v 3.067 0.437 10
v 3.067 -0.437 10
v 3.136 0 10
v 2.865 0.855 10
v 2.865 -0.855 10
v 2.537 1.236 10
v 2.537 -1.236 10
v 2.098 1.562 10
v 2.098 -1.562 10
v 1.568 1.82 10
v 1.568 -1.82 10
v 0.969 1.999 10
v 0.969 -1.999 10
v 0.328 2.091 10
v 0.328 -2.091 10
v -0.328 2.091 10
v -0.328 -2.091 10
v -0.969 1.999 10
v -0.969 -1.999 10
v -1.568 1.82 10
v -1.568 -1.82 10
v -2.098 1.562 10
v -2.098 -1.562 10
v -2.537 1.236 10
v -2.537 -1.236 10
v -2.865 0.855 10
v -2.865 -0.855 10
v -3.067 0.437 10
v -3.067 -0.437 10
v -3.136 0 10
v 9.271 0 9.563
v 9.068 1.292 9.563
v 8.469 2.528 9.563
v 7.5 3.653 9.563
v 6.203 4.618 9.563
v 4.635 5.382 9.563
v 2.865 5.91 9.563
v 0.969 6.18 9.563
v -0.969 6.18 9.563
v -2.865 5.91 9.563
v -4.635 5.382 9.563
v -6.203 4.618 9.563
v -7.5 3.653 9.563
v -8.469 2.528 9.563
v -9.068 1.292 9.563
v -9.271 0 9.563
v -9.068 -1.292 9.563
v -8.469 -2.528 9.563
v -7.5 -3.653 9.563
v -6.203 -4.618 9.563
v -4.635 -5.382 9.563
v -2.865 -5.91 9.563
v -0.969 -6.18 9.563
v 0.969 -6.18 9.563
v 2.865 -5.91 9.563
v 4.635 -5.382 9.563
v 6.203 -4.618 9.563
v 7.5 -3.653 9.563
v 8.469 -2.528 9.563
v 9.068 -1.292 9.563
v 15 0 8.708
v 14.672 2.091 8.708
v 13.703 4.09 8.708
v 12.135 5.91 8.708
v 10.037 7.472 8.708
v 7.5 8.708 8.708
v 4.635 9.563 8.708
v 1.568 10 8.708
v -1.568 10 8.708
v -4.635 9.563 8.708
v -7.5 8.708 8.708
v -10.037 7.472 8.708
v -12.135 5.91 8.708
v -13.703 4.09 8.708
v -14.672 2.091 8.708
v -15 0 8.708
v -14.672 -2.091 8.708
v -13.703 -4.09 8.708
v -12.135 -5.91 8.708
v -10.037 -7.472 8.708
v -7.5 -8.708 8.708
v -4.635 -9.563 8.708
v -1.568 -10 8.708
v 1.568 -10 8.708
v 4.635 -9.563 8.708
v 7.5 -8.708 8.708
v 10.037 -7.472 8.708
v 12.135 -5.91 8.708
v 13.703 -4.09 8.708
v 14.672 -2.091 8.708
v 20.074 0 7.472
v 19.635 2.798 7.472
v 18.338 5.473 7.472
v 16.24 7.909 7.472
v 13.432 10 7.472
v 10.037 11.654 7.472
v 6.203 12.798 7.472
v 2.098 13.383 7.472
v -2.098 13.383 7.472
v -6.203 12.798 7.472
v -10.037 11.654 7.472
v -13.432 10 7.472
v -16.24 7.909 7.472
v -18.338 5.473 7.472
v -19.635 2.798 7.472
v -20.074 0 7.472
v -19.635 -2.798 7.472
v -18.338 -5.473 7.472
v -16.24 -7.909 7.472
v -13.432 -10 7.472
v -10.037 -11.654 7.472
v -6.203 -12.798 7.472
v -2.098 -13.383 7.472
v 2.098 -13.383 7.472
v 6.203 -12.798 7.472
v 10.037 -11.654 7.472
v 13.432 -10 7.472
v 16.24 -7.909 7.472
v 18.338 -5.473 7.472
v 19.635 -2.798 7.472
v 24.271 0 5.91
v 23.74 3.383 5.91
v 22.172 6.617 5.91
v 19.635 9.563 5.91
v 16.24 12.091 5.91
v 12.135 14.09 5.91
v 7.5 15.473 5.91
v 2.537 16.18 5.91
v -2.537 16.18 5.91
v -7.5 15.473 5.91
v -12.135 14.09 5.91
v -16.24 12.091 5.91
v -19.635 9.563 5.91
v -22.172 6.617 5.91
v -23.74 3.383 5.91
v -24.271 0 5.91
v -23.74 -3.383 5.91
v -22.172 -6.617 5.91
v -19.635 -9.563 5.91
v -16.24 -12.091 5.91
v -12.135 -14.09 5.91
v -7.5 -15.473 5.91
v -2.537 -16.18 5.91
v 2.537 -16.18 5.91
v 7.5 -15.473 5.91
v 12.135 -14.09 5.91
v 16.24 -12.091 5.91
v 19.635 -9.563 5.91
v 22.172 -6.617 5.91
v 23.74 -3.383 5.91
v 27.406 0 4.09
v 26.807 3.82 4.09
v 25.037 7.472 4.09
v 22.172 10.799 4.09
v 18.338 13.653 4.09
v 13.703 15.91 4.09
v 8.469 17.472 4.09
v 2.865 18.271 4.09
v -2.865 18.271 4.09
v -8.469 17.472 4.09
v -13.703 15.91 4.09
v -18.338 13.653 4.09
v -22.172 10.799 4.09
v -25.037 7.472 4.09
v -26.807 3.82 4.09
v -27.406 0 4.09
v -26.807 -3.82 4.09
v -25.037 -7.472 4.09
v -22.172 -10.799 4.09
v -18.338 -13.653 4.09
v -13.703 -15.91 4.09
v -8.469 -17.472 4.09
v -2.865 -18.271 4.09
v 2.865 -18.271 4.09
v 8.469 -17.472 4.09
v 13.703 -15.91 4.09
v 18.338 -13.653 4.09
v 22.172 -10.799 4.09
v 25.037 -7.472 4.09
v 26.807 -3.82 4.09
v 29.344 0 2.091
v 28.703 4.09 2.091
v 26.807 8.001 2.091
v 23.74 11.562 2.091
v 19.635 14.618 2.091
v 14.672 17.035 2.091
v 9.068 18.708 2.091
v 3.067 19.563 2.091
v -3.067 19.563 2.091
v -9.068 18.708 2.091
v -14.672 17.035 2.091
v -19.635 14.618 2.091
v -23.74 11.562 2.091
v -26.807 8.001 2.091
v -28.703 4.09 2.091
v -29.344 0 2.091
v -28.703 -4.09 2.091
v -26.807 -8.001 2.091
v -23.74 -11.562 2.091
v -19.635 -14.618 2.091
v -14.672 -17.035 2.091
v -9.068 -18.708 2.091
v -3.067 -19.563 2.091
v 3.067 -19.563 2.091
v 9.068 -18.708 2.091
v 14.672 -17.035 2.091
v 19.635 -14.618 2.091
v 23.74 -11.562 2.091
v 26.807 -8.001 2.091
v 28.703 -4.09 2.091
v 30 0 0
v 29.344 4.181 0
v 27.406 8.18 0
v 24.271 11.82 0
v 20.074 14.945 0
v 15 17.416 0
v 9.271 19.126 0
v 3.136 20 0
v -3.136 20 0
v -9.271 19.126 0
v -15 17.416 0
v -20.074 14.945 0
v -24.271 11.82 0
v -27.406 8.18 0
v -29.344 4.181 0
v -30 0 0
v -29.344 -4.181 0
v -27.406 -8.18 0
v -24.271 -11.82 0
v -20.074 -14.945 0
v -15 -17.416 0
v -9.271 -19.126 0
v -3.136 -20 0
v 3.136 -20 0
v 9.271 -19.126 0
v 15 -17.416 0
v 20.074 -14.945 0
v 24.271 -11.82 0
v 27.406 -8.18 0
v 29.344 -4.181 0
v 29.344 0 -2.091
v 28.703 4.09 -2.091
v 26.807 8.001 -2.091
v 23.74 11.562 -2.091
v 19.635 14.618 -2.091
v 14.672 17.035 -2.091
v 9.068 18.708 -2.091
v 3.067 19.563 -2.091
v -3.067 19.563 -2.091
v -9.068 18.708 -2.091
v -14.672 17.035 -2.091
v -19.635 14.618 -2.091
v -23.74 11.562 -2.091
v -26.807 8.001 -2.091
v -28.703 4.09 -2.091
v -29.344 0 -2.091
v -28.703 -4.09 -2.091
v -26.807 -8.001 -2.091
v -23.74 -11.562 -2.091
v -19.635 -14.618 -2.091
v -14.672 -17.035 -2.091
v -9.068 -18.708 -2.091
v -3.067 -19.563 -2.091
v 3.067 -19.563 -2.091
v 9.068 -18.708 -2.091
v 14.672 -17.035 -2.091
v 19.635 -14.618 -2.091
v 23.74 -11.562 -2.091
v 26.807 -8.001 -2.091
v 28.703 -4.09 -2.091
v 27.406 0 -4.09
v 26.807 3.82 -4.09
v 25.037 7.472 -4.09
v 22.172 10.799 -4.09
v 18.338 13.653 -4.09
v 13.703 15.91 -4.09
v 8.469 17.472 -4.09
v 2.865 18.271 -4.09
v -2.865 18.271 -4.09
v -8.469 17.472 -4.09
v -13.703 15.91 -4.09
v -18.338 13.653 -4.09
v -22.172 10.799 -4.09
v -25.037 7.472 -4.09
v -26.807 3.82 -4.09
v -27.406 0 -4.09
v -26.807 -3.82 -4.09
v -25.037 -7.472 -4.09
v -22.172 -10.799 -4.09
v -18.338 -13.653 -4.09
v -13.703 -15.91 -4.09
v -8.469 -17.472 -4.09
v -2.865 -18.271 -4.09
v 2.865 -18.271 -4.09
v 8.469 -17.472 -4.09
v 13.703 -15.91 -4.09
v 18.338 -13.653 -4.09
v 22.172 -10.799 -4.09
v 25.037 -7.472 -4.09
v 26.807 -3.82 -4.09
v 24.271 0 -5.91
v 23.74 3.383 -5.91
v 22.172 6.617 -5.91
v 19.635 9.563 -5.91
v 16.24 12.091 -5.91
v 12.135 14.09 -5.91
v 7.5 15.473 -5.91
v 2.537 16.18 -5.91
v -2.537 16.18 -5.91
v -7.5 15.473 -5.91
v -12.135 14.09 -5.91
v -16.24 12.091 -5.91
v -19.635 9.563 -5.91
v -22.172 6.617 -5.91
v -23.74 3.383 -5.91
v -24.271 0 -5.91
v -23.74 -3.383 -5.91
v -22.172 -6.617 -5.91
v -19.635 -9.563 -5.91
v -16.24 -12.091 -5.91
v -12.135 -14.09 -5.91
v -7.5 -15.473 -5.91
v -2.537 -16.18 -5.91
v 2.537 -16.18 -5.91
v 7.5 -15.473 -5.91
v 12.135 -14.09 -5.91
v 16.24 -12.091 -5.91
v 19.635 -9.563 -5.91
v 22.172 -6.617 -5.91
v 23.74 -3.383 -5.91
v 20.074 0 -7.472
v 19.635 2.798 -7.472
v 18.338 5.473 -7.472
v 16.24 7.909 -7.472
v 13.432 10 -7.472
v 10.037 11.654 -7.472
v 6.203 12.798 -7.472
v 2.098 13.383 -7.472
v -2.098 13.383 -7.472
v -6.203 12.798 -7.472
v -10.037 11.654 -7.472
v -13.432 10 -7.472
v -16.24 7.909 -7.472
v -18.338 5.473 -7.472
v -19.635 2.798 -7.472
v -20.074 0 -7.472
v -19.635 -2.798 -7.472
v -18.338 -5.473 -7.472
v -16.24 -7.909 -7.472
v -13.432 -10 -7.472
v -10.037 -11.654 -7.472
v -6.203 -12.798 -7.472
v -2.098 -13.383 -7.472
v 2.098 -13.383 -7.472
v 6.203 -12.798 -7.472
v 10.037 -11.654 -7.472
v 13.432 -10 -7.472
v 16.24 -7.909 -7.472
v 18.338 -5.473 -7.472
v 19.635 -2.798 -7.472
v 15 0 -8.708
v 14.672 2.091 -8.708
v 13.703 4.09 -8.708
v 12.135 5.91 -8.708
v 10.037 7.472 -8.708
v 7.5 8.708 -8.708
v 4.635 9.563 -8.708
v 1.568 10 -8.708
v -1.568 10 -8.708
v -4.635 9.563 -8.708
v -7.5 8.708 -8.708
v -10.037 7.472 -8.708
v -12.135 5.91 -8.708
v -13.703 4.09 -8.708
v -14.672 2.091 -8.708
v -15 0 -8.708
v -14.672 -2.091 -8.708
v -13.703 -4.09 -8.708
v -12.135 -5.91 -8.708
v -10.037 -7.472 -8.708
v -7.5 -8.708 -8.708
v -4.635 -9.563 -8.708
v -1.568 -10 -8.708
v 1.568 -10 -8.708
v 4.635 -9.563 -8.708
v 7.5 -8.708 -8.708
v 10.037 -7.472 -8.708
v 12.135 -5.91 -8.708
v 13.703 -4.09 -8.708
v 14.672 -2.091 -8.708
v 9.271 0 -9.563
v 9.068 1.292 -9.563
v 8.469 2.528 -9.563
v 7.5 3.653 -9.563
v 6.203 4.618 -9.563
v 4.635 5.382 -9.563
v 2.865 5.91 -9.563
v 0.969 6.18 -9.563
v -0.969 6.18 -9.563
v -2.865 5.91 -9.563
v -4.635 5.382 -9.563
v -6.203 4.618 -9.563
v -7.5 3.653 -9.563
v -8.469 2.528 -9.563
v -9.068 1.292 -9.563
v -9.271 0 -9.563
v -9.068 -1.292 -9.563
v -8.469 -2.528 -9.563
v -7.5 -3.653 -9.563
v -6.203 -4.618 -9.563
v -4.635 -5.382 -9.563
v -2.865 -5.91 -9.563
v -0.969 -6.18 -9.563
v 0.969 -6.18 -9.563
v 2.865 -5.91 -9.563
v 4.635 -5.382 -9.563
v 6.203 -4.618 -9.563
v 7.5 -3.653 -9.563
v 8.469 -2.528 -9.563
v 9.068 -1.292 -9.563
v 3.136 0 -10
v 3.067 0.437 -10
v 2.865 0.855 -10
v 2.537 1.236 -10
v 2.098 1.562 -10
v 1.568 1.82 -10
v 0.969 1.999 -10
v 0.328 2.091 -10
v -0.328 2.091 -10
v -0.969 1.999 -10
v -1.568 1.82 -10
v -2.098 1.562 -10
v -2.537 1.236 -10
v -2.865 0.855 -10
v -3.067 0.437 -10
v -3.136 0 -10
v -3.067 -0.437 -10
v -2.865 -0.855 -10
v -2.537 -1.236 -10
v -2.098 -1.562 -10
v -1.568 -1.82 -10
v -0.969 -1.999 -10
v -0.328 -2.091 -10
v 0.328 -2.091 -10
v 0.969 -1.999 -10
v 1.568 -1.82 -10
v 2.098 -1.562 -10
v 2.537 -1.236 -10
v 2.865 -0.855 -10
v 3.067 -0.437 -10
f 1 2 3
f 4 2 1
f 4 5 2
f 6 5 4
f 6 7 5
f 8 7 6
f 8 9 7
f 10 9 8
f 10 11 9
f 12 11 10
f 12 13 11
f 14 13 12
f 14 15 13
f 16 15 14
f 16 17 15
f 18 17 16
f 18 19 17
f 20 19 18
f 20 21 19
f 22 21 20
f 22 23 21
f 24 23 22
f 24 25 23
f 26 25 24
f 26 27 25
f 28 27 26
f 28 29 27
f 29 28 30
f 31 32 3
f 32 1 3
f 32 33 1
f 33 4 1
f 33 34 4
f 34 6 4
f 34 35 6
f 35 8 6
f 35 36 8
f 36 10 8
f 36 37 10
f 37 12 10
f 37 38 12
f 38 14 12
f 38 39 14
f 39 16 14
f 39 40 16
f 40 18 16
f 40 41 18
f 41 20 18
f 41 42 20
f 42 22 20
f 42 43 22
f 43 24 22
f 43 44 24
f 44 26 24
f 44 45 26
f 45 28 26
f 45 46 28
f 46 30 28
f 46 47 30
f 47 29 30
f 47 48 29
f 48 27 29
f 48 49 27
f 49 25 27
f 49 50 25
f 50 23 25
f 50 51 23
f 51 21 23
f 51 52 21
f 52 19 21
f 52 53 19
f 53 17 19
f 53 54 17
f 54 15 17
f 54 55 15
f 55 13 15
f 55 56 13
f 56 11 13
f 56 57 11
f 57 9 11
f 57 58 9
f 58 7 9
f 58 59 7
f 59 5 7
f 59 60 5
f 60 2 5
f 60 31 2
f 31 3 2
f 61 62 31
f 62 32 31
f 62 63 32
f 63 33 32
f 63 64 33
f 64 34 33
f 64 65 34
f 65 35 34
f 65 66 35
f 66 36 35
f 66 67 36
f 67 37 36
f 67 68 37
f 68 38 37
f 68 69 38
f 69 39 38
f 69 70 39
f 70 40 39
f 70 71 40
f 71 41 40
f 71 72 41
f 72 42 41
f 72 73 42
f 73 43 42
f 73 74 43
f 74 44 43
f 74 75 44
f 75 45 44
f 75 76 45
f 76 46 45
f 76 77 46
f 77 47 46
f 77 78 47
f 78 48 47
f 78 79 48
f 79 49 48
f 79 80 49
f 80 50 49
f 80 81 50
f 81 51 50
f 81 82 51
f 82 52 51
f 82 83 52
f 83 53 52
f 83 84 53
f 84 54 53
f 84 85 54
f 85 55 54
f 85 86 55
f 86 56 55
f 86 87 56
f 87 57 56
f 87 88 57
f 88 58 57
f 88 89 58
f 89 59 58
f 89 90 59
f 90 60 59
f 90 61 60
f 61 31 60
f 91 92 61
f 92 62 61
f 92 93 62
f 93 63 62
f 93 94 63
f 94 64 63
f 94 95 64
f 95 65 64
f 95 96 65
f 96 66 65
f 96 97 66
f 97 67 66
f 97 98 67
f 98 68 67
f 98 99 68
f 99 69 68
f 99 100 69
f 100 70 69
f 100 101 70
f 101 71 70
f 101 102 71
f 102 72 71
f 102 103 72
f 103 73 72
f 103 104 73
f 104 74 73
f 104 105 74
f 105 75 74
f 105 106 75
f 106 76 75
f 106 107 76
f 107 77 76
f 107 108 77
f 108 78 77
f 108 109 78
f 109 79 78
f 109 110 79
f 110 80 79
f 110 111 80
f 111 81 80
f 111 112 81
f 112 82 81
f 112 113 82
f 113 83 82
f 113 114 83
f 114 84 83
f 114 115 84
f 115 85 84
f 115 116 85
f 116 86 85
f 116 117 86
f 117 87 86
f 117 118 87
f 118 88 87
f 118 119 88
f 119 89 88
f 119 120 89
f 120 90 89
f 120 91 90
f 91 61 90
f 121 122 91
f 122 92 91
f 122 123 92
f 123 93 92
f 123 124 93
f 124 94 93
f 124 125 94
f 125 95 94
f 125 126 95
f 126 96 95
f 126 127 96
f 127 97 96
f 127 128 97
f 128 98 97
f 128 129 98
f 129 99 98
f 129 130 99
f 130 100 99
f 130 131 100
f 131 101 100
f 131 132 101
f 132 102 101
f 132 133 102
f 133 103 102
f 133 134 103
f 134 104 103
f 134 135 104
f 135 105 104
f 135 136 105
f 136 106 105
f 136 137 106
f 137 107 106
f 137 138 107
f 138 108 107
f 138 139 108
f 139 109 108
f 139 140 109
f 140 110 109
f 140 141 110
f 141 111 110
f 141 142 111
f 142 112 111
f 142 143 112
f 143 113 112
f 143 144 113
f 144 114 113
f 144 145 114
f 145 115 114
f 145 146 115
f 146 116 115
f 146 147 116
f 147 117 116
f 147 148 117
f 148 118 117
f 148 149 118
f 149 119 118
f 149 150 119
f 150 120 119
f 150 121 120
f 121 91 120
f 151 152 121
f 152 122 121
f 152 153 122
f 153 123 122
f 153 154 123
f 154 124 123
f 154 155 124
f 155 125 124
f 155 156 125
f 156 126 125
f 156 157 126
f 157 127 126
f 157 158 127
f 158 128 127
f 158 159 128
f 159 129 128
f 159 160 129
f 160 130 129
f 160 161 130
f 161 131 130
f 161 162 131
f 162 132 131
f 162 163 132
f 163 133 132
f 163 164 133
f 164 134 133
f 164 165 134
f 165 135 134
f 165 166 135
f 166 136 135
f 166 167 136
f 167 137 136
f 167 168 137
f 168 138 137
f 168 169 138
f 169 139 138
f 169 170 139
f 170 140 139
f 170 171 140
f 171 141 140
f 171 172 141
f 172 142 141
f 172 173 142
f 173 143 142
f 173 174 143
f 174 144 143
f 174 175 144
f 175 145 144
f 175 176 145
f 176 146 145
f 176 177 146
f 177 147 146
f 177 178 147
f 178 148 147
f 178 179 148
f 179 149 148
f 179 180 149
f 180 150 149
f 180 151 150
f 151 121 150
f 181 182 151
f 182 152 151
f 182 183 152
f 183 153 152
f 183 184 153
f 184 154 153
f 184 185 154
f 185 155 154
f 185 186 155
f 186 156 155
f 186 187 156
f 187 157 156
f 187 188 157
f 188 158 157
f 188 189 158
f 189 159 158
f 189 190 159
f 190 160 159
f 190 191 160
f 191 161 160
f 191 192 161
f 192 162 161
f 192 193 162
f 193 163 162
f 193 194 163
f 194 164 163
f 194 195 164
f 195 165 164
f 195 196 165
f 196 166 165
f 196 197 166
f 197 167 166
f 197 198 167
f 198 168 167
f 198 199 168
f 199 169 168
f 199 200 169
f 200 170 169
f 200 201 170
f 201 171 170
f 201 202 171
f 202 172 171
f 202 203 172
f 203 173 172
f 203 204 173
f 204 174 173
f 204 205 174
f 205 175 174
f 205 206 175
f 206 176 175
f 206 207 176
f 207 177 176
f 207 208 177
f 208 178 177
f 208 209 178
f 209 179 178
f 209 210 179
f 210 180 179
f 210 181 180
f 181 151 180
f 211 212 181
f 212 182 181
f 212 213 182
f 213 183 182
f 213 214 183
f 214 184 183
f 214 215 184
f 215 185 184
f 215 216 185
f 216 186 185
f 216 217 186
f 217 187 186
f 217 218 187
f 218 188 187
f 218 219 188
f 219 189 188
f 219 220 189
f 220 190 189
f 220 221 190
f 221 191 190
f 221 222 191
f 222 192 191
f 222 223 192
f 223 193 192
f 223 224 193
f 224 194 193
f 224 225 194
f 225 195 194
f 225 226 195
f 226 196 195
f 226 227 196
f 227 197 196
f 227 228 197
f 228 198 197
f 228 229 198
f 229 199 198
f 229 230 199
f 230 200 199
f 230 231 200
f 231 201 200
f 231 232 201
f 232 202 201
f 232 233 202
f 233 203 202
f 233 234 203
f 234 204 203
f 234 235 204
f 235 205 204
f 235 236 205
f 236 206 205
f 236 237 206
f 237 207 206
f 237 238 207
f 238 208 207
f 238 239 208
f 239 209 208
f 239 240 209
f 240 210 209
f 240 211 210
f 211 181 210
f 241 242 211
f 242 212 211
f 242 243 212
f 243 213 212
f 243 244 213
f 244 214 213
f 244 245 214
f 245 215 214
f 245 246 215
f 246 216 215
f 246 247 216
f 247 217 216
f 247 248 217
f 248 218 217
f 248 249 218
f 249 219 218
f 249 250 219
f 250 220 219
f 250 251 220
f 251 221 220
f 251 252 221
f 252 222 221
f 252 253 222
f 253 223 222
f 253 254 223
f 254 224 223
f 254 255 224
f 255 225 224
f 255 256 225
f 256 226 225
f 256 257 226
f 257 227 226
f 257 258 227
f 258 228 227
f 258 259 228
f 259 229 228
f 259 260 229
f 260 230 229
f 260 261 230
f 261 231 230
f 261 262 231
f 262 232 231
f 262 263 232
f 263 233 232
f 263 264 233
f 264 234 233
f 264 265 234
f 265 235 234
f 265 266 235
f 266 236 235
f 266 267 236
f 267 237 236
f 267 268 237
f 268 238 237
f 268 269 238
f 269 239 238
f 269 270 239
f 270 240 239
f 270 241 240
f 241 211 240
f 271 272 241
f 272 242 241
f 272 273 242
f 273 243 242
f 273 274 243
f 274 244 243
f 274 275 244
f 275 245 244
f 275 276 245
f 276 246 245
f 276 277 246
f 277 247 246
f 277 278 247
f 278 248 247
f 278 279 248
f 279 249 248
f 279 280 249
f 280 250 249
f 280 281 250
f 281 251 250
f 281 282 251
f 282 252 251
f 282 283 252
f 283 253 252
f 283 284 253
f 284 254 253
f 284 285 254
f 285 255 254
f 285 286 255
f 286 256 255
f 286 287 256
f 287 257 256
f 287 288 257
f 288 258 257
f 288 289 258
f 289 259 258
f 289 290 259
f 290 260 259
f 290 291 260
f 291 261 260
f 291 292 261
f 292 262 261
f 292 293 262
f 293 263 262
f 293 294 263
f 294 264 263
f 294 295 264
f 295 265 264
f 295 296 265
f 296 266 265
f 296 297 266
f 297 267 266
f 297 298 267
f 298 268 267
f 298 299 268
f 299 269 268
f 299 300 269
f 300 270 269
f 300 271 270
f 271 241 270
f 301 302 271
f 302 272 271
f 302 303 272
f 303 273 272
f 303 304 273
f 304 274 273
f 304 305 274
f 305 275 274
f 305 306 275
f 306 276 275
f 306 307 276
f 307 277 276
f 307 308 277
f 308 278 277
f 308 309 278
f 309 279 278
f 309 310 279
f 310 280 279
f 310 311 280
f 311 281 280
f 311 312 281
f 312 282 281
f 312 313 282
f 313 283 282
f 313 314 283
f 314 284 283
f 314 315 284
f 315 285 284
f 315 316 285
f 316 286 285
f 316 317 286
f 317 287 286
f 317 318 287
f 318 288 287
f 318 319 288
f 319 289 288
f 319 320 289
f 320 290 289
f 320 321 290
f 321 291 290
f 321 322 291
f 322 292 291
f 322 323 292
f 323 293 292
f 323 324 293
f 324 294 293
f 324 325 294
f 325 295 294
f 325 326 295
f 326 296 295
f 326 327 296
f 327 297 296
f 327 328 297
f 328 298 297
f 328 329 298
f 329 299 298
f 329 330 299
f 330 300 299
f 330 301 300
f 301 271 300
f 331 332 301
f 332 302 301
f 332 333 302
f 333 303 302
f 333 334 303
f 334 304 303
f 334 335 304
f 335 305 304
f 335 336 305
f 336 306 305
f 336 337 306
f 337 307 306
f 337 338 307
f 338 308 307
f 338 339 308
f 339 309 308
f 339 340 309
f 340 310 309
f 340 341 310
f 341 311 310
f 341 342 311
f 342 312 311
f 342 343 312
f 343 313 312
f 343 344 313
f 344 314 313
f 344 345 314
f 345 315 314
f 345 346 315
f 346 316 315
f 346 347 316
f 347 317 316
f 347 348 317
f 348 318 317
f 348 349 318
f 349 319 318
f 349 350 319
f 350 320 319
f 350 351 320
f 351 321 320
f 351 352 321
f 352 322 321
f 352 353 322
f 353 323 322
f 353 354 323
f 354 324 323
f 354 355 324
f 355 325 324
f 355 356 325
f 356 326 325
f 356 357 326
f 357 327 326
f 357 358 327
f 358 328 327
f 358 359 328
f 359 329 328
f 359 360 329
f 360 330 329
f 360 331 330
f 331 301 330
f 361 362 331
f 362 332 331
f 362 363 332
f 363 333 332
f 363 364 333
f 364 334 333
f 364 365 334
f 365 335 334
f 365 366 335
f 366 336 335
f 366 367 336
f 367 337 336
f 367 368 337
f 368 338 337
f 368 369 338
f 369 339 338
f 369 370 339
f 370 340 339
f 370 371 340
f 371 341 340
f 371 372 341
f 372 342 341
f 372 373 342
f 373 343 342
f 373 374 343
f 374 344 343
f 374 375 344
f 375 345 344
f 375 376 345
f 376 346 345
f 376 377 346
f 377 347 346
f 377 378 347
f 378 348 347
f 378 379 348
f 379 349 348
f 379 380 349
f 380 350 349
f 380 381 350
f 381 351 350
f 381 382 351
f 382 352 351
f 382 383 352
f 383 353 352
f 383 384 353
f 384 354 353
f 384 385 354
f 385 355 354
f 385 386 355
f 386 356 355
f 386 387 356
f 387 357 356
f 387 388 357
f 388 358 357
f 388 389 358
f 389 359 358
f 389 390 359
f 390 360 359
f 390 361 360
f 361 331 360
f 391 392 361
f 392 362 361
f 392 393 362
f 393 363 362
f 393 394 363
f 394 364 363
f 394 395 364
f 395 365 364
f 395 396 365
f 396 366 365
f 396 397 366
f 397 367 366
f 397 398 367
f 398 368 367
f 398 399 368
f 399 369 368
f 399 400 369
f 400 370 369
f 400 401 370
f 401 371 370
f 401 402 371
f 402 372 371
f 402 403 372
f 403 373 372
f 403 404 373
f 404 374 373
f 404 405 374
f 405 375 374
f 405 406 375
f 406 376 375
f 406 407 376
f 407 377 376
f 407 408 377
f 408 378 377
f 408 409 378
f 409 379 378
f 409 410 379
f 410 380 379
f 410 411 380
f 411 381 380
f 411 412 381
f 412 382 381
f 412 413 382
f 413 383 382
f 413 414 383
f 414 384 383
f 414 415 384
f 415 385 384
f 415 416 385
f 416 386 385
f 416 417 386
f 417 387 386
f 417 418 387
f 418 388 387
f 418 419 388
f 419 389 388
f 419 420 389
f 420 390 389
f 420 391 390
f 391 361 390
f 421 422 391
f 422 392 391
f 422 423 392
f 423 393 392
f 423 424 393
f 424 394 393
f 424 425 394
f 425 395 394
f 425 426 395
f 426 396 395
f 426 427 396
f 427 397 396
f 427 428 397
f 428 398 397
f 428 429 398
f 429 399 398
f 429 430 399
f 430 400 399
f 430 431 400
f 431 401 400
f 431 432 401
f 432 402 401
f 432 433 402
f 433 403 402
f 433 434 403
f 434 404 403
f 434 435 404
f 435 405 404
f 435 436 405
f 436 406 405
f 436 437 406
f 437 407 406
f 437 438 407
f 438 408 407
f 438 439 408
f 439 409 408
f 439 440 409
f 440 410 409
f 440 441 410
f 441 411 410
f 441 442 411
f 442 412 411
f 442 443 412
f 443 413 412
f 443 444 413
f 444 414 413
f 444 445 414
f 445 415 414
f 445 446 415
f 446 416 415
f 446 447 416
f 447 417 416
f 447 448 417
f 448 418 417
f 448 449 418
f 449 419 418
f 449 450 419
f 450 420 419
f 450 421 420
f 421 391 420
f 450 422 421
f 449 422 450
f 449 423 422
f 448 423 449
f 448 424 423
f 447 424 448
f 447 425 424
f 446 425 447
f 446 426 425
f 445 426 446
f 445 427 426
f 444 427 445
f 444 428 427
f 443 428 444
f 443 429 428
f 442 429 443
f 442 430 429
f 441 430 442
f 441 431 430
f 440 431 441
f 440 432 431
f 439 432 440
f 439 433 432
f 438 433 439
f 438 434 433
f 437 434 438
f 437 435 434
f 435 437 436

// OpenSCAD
// Unit of length: Unit.INCH
resize(newsize = [60.0, 40.0, 20.0], auto = [false, false, false])
{
   sphere(d = 60.0, $fa = 12.0, $fs = 2.0, $fn = 0);
}
